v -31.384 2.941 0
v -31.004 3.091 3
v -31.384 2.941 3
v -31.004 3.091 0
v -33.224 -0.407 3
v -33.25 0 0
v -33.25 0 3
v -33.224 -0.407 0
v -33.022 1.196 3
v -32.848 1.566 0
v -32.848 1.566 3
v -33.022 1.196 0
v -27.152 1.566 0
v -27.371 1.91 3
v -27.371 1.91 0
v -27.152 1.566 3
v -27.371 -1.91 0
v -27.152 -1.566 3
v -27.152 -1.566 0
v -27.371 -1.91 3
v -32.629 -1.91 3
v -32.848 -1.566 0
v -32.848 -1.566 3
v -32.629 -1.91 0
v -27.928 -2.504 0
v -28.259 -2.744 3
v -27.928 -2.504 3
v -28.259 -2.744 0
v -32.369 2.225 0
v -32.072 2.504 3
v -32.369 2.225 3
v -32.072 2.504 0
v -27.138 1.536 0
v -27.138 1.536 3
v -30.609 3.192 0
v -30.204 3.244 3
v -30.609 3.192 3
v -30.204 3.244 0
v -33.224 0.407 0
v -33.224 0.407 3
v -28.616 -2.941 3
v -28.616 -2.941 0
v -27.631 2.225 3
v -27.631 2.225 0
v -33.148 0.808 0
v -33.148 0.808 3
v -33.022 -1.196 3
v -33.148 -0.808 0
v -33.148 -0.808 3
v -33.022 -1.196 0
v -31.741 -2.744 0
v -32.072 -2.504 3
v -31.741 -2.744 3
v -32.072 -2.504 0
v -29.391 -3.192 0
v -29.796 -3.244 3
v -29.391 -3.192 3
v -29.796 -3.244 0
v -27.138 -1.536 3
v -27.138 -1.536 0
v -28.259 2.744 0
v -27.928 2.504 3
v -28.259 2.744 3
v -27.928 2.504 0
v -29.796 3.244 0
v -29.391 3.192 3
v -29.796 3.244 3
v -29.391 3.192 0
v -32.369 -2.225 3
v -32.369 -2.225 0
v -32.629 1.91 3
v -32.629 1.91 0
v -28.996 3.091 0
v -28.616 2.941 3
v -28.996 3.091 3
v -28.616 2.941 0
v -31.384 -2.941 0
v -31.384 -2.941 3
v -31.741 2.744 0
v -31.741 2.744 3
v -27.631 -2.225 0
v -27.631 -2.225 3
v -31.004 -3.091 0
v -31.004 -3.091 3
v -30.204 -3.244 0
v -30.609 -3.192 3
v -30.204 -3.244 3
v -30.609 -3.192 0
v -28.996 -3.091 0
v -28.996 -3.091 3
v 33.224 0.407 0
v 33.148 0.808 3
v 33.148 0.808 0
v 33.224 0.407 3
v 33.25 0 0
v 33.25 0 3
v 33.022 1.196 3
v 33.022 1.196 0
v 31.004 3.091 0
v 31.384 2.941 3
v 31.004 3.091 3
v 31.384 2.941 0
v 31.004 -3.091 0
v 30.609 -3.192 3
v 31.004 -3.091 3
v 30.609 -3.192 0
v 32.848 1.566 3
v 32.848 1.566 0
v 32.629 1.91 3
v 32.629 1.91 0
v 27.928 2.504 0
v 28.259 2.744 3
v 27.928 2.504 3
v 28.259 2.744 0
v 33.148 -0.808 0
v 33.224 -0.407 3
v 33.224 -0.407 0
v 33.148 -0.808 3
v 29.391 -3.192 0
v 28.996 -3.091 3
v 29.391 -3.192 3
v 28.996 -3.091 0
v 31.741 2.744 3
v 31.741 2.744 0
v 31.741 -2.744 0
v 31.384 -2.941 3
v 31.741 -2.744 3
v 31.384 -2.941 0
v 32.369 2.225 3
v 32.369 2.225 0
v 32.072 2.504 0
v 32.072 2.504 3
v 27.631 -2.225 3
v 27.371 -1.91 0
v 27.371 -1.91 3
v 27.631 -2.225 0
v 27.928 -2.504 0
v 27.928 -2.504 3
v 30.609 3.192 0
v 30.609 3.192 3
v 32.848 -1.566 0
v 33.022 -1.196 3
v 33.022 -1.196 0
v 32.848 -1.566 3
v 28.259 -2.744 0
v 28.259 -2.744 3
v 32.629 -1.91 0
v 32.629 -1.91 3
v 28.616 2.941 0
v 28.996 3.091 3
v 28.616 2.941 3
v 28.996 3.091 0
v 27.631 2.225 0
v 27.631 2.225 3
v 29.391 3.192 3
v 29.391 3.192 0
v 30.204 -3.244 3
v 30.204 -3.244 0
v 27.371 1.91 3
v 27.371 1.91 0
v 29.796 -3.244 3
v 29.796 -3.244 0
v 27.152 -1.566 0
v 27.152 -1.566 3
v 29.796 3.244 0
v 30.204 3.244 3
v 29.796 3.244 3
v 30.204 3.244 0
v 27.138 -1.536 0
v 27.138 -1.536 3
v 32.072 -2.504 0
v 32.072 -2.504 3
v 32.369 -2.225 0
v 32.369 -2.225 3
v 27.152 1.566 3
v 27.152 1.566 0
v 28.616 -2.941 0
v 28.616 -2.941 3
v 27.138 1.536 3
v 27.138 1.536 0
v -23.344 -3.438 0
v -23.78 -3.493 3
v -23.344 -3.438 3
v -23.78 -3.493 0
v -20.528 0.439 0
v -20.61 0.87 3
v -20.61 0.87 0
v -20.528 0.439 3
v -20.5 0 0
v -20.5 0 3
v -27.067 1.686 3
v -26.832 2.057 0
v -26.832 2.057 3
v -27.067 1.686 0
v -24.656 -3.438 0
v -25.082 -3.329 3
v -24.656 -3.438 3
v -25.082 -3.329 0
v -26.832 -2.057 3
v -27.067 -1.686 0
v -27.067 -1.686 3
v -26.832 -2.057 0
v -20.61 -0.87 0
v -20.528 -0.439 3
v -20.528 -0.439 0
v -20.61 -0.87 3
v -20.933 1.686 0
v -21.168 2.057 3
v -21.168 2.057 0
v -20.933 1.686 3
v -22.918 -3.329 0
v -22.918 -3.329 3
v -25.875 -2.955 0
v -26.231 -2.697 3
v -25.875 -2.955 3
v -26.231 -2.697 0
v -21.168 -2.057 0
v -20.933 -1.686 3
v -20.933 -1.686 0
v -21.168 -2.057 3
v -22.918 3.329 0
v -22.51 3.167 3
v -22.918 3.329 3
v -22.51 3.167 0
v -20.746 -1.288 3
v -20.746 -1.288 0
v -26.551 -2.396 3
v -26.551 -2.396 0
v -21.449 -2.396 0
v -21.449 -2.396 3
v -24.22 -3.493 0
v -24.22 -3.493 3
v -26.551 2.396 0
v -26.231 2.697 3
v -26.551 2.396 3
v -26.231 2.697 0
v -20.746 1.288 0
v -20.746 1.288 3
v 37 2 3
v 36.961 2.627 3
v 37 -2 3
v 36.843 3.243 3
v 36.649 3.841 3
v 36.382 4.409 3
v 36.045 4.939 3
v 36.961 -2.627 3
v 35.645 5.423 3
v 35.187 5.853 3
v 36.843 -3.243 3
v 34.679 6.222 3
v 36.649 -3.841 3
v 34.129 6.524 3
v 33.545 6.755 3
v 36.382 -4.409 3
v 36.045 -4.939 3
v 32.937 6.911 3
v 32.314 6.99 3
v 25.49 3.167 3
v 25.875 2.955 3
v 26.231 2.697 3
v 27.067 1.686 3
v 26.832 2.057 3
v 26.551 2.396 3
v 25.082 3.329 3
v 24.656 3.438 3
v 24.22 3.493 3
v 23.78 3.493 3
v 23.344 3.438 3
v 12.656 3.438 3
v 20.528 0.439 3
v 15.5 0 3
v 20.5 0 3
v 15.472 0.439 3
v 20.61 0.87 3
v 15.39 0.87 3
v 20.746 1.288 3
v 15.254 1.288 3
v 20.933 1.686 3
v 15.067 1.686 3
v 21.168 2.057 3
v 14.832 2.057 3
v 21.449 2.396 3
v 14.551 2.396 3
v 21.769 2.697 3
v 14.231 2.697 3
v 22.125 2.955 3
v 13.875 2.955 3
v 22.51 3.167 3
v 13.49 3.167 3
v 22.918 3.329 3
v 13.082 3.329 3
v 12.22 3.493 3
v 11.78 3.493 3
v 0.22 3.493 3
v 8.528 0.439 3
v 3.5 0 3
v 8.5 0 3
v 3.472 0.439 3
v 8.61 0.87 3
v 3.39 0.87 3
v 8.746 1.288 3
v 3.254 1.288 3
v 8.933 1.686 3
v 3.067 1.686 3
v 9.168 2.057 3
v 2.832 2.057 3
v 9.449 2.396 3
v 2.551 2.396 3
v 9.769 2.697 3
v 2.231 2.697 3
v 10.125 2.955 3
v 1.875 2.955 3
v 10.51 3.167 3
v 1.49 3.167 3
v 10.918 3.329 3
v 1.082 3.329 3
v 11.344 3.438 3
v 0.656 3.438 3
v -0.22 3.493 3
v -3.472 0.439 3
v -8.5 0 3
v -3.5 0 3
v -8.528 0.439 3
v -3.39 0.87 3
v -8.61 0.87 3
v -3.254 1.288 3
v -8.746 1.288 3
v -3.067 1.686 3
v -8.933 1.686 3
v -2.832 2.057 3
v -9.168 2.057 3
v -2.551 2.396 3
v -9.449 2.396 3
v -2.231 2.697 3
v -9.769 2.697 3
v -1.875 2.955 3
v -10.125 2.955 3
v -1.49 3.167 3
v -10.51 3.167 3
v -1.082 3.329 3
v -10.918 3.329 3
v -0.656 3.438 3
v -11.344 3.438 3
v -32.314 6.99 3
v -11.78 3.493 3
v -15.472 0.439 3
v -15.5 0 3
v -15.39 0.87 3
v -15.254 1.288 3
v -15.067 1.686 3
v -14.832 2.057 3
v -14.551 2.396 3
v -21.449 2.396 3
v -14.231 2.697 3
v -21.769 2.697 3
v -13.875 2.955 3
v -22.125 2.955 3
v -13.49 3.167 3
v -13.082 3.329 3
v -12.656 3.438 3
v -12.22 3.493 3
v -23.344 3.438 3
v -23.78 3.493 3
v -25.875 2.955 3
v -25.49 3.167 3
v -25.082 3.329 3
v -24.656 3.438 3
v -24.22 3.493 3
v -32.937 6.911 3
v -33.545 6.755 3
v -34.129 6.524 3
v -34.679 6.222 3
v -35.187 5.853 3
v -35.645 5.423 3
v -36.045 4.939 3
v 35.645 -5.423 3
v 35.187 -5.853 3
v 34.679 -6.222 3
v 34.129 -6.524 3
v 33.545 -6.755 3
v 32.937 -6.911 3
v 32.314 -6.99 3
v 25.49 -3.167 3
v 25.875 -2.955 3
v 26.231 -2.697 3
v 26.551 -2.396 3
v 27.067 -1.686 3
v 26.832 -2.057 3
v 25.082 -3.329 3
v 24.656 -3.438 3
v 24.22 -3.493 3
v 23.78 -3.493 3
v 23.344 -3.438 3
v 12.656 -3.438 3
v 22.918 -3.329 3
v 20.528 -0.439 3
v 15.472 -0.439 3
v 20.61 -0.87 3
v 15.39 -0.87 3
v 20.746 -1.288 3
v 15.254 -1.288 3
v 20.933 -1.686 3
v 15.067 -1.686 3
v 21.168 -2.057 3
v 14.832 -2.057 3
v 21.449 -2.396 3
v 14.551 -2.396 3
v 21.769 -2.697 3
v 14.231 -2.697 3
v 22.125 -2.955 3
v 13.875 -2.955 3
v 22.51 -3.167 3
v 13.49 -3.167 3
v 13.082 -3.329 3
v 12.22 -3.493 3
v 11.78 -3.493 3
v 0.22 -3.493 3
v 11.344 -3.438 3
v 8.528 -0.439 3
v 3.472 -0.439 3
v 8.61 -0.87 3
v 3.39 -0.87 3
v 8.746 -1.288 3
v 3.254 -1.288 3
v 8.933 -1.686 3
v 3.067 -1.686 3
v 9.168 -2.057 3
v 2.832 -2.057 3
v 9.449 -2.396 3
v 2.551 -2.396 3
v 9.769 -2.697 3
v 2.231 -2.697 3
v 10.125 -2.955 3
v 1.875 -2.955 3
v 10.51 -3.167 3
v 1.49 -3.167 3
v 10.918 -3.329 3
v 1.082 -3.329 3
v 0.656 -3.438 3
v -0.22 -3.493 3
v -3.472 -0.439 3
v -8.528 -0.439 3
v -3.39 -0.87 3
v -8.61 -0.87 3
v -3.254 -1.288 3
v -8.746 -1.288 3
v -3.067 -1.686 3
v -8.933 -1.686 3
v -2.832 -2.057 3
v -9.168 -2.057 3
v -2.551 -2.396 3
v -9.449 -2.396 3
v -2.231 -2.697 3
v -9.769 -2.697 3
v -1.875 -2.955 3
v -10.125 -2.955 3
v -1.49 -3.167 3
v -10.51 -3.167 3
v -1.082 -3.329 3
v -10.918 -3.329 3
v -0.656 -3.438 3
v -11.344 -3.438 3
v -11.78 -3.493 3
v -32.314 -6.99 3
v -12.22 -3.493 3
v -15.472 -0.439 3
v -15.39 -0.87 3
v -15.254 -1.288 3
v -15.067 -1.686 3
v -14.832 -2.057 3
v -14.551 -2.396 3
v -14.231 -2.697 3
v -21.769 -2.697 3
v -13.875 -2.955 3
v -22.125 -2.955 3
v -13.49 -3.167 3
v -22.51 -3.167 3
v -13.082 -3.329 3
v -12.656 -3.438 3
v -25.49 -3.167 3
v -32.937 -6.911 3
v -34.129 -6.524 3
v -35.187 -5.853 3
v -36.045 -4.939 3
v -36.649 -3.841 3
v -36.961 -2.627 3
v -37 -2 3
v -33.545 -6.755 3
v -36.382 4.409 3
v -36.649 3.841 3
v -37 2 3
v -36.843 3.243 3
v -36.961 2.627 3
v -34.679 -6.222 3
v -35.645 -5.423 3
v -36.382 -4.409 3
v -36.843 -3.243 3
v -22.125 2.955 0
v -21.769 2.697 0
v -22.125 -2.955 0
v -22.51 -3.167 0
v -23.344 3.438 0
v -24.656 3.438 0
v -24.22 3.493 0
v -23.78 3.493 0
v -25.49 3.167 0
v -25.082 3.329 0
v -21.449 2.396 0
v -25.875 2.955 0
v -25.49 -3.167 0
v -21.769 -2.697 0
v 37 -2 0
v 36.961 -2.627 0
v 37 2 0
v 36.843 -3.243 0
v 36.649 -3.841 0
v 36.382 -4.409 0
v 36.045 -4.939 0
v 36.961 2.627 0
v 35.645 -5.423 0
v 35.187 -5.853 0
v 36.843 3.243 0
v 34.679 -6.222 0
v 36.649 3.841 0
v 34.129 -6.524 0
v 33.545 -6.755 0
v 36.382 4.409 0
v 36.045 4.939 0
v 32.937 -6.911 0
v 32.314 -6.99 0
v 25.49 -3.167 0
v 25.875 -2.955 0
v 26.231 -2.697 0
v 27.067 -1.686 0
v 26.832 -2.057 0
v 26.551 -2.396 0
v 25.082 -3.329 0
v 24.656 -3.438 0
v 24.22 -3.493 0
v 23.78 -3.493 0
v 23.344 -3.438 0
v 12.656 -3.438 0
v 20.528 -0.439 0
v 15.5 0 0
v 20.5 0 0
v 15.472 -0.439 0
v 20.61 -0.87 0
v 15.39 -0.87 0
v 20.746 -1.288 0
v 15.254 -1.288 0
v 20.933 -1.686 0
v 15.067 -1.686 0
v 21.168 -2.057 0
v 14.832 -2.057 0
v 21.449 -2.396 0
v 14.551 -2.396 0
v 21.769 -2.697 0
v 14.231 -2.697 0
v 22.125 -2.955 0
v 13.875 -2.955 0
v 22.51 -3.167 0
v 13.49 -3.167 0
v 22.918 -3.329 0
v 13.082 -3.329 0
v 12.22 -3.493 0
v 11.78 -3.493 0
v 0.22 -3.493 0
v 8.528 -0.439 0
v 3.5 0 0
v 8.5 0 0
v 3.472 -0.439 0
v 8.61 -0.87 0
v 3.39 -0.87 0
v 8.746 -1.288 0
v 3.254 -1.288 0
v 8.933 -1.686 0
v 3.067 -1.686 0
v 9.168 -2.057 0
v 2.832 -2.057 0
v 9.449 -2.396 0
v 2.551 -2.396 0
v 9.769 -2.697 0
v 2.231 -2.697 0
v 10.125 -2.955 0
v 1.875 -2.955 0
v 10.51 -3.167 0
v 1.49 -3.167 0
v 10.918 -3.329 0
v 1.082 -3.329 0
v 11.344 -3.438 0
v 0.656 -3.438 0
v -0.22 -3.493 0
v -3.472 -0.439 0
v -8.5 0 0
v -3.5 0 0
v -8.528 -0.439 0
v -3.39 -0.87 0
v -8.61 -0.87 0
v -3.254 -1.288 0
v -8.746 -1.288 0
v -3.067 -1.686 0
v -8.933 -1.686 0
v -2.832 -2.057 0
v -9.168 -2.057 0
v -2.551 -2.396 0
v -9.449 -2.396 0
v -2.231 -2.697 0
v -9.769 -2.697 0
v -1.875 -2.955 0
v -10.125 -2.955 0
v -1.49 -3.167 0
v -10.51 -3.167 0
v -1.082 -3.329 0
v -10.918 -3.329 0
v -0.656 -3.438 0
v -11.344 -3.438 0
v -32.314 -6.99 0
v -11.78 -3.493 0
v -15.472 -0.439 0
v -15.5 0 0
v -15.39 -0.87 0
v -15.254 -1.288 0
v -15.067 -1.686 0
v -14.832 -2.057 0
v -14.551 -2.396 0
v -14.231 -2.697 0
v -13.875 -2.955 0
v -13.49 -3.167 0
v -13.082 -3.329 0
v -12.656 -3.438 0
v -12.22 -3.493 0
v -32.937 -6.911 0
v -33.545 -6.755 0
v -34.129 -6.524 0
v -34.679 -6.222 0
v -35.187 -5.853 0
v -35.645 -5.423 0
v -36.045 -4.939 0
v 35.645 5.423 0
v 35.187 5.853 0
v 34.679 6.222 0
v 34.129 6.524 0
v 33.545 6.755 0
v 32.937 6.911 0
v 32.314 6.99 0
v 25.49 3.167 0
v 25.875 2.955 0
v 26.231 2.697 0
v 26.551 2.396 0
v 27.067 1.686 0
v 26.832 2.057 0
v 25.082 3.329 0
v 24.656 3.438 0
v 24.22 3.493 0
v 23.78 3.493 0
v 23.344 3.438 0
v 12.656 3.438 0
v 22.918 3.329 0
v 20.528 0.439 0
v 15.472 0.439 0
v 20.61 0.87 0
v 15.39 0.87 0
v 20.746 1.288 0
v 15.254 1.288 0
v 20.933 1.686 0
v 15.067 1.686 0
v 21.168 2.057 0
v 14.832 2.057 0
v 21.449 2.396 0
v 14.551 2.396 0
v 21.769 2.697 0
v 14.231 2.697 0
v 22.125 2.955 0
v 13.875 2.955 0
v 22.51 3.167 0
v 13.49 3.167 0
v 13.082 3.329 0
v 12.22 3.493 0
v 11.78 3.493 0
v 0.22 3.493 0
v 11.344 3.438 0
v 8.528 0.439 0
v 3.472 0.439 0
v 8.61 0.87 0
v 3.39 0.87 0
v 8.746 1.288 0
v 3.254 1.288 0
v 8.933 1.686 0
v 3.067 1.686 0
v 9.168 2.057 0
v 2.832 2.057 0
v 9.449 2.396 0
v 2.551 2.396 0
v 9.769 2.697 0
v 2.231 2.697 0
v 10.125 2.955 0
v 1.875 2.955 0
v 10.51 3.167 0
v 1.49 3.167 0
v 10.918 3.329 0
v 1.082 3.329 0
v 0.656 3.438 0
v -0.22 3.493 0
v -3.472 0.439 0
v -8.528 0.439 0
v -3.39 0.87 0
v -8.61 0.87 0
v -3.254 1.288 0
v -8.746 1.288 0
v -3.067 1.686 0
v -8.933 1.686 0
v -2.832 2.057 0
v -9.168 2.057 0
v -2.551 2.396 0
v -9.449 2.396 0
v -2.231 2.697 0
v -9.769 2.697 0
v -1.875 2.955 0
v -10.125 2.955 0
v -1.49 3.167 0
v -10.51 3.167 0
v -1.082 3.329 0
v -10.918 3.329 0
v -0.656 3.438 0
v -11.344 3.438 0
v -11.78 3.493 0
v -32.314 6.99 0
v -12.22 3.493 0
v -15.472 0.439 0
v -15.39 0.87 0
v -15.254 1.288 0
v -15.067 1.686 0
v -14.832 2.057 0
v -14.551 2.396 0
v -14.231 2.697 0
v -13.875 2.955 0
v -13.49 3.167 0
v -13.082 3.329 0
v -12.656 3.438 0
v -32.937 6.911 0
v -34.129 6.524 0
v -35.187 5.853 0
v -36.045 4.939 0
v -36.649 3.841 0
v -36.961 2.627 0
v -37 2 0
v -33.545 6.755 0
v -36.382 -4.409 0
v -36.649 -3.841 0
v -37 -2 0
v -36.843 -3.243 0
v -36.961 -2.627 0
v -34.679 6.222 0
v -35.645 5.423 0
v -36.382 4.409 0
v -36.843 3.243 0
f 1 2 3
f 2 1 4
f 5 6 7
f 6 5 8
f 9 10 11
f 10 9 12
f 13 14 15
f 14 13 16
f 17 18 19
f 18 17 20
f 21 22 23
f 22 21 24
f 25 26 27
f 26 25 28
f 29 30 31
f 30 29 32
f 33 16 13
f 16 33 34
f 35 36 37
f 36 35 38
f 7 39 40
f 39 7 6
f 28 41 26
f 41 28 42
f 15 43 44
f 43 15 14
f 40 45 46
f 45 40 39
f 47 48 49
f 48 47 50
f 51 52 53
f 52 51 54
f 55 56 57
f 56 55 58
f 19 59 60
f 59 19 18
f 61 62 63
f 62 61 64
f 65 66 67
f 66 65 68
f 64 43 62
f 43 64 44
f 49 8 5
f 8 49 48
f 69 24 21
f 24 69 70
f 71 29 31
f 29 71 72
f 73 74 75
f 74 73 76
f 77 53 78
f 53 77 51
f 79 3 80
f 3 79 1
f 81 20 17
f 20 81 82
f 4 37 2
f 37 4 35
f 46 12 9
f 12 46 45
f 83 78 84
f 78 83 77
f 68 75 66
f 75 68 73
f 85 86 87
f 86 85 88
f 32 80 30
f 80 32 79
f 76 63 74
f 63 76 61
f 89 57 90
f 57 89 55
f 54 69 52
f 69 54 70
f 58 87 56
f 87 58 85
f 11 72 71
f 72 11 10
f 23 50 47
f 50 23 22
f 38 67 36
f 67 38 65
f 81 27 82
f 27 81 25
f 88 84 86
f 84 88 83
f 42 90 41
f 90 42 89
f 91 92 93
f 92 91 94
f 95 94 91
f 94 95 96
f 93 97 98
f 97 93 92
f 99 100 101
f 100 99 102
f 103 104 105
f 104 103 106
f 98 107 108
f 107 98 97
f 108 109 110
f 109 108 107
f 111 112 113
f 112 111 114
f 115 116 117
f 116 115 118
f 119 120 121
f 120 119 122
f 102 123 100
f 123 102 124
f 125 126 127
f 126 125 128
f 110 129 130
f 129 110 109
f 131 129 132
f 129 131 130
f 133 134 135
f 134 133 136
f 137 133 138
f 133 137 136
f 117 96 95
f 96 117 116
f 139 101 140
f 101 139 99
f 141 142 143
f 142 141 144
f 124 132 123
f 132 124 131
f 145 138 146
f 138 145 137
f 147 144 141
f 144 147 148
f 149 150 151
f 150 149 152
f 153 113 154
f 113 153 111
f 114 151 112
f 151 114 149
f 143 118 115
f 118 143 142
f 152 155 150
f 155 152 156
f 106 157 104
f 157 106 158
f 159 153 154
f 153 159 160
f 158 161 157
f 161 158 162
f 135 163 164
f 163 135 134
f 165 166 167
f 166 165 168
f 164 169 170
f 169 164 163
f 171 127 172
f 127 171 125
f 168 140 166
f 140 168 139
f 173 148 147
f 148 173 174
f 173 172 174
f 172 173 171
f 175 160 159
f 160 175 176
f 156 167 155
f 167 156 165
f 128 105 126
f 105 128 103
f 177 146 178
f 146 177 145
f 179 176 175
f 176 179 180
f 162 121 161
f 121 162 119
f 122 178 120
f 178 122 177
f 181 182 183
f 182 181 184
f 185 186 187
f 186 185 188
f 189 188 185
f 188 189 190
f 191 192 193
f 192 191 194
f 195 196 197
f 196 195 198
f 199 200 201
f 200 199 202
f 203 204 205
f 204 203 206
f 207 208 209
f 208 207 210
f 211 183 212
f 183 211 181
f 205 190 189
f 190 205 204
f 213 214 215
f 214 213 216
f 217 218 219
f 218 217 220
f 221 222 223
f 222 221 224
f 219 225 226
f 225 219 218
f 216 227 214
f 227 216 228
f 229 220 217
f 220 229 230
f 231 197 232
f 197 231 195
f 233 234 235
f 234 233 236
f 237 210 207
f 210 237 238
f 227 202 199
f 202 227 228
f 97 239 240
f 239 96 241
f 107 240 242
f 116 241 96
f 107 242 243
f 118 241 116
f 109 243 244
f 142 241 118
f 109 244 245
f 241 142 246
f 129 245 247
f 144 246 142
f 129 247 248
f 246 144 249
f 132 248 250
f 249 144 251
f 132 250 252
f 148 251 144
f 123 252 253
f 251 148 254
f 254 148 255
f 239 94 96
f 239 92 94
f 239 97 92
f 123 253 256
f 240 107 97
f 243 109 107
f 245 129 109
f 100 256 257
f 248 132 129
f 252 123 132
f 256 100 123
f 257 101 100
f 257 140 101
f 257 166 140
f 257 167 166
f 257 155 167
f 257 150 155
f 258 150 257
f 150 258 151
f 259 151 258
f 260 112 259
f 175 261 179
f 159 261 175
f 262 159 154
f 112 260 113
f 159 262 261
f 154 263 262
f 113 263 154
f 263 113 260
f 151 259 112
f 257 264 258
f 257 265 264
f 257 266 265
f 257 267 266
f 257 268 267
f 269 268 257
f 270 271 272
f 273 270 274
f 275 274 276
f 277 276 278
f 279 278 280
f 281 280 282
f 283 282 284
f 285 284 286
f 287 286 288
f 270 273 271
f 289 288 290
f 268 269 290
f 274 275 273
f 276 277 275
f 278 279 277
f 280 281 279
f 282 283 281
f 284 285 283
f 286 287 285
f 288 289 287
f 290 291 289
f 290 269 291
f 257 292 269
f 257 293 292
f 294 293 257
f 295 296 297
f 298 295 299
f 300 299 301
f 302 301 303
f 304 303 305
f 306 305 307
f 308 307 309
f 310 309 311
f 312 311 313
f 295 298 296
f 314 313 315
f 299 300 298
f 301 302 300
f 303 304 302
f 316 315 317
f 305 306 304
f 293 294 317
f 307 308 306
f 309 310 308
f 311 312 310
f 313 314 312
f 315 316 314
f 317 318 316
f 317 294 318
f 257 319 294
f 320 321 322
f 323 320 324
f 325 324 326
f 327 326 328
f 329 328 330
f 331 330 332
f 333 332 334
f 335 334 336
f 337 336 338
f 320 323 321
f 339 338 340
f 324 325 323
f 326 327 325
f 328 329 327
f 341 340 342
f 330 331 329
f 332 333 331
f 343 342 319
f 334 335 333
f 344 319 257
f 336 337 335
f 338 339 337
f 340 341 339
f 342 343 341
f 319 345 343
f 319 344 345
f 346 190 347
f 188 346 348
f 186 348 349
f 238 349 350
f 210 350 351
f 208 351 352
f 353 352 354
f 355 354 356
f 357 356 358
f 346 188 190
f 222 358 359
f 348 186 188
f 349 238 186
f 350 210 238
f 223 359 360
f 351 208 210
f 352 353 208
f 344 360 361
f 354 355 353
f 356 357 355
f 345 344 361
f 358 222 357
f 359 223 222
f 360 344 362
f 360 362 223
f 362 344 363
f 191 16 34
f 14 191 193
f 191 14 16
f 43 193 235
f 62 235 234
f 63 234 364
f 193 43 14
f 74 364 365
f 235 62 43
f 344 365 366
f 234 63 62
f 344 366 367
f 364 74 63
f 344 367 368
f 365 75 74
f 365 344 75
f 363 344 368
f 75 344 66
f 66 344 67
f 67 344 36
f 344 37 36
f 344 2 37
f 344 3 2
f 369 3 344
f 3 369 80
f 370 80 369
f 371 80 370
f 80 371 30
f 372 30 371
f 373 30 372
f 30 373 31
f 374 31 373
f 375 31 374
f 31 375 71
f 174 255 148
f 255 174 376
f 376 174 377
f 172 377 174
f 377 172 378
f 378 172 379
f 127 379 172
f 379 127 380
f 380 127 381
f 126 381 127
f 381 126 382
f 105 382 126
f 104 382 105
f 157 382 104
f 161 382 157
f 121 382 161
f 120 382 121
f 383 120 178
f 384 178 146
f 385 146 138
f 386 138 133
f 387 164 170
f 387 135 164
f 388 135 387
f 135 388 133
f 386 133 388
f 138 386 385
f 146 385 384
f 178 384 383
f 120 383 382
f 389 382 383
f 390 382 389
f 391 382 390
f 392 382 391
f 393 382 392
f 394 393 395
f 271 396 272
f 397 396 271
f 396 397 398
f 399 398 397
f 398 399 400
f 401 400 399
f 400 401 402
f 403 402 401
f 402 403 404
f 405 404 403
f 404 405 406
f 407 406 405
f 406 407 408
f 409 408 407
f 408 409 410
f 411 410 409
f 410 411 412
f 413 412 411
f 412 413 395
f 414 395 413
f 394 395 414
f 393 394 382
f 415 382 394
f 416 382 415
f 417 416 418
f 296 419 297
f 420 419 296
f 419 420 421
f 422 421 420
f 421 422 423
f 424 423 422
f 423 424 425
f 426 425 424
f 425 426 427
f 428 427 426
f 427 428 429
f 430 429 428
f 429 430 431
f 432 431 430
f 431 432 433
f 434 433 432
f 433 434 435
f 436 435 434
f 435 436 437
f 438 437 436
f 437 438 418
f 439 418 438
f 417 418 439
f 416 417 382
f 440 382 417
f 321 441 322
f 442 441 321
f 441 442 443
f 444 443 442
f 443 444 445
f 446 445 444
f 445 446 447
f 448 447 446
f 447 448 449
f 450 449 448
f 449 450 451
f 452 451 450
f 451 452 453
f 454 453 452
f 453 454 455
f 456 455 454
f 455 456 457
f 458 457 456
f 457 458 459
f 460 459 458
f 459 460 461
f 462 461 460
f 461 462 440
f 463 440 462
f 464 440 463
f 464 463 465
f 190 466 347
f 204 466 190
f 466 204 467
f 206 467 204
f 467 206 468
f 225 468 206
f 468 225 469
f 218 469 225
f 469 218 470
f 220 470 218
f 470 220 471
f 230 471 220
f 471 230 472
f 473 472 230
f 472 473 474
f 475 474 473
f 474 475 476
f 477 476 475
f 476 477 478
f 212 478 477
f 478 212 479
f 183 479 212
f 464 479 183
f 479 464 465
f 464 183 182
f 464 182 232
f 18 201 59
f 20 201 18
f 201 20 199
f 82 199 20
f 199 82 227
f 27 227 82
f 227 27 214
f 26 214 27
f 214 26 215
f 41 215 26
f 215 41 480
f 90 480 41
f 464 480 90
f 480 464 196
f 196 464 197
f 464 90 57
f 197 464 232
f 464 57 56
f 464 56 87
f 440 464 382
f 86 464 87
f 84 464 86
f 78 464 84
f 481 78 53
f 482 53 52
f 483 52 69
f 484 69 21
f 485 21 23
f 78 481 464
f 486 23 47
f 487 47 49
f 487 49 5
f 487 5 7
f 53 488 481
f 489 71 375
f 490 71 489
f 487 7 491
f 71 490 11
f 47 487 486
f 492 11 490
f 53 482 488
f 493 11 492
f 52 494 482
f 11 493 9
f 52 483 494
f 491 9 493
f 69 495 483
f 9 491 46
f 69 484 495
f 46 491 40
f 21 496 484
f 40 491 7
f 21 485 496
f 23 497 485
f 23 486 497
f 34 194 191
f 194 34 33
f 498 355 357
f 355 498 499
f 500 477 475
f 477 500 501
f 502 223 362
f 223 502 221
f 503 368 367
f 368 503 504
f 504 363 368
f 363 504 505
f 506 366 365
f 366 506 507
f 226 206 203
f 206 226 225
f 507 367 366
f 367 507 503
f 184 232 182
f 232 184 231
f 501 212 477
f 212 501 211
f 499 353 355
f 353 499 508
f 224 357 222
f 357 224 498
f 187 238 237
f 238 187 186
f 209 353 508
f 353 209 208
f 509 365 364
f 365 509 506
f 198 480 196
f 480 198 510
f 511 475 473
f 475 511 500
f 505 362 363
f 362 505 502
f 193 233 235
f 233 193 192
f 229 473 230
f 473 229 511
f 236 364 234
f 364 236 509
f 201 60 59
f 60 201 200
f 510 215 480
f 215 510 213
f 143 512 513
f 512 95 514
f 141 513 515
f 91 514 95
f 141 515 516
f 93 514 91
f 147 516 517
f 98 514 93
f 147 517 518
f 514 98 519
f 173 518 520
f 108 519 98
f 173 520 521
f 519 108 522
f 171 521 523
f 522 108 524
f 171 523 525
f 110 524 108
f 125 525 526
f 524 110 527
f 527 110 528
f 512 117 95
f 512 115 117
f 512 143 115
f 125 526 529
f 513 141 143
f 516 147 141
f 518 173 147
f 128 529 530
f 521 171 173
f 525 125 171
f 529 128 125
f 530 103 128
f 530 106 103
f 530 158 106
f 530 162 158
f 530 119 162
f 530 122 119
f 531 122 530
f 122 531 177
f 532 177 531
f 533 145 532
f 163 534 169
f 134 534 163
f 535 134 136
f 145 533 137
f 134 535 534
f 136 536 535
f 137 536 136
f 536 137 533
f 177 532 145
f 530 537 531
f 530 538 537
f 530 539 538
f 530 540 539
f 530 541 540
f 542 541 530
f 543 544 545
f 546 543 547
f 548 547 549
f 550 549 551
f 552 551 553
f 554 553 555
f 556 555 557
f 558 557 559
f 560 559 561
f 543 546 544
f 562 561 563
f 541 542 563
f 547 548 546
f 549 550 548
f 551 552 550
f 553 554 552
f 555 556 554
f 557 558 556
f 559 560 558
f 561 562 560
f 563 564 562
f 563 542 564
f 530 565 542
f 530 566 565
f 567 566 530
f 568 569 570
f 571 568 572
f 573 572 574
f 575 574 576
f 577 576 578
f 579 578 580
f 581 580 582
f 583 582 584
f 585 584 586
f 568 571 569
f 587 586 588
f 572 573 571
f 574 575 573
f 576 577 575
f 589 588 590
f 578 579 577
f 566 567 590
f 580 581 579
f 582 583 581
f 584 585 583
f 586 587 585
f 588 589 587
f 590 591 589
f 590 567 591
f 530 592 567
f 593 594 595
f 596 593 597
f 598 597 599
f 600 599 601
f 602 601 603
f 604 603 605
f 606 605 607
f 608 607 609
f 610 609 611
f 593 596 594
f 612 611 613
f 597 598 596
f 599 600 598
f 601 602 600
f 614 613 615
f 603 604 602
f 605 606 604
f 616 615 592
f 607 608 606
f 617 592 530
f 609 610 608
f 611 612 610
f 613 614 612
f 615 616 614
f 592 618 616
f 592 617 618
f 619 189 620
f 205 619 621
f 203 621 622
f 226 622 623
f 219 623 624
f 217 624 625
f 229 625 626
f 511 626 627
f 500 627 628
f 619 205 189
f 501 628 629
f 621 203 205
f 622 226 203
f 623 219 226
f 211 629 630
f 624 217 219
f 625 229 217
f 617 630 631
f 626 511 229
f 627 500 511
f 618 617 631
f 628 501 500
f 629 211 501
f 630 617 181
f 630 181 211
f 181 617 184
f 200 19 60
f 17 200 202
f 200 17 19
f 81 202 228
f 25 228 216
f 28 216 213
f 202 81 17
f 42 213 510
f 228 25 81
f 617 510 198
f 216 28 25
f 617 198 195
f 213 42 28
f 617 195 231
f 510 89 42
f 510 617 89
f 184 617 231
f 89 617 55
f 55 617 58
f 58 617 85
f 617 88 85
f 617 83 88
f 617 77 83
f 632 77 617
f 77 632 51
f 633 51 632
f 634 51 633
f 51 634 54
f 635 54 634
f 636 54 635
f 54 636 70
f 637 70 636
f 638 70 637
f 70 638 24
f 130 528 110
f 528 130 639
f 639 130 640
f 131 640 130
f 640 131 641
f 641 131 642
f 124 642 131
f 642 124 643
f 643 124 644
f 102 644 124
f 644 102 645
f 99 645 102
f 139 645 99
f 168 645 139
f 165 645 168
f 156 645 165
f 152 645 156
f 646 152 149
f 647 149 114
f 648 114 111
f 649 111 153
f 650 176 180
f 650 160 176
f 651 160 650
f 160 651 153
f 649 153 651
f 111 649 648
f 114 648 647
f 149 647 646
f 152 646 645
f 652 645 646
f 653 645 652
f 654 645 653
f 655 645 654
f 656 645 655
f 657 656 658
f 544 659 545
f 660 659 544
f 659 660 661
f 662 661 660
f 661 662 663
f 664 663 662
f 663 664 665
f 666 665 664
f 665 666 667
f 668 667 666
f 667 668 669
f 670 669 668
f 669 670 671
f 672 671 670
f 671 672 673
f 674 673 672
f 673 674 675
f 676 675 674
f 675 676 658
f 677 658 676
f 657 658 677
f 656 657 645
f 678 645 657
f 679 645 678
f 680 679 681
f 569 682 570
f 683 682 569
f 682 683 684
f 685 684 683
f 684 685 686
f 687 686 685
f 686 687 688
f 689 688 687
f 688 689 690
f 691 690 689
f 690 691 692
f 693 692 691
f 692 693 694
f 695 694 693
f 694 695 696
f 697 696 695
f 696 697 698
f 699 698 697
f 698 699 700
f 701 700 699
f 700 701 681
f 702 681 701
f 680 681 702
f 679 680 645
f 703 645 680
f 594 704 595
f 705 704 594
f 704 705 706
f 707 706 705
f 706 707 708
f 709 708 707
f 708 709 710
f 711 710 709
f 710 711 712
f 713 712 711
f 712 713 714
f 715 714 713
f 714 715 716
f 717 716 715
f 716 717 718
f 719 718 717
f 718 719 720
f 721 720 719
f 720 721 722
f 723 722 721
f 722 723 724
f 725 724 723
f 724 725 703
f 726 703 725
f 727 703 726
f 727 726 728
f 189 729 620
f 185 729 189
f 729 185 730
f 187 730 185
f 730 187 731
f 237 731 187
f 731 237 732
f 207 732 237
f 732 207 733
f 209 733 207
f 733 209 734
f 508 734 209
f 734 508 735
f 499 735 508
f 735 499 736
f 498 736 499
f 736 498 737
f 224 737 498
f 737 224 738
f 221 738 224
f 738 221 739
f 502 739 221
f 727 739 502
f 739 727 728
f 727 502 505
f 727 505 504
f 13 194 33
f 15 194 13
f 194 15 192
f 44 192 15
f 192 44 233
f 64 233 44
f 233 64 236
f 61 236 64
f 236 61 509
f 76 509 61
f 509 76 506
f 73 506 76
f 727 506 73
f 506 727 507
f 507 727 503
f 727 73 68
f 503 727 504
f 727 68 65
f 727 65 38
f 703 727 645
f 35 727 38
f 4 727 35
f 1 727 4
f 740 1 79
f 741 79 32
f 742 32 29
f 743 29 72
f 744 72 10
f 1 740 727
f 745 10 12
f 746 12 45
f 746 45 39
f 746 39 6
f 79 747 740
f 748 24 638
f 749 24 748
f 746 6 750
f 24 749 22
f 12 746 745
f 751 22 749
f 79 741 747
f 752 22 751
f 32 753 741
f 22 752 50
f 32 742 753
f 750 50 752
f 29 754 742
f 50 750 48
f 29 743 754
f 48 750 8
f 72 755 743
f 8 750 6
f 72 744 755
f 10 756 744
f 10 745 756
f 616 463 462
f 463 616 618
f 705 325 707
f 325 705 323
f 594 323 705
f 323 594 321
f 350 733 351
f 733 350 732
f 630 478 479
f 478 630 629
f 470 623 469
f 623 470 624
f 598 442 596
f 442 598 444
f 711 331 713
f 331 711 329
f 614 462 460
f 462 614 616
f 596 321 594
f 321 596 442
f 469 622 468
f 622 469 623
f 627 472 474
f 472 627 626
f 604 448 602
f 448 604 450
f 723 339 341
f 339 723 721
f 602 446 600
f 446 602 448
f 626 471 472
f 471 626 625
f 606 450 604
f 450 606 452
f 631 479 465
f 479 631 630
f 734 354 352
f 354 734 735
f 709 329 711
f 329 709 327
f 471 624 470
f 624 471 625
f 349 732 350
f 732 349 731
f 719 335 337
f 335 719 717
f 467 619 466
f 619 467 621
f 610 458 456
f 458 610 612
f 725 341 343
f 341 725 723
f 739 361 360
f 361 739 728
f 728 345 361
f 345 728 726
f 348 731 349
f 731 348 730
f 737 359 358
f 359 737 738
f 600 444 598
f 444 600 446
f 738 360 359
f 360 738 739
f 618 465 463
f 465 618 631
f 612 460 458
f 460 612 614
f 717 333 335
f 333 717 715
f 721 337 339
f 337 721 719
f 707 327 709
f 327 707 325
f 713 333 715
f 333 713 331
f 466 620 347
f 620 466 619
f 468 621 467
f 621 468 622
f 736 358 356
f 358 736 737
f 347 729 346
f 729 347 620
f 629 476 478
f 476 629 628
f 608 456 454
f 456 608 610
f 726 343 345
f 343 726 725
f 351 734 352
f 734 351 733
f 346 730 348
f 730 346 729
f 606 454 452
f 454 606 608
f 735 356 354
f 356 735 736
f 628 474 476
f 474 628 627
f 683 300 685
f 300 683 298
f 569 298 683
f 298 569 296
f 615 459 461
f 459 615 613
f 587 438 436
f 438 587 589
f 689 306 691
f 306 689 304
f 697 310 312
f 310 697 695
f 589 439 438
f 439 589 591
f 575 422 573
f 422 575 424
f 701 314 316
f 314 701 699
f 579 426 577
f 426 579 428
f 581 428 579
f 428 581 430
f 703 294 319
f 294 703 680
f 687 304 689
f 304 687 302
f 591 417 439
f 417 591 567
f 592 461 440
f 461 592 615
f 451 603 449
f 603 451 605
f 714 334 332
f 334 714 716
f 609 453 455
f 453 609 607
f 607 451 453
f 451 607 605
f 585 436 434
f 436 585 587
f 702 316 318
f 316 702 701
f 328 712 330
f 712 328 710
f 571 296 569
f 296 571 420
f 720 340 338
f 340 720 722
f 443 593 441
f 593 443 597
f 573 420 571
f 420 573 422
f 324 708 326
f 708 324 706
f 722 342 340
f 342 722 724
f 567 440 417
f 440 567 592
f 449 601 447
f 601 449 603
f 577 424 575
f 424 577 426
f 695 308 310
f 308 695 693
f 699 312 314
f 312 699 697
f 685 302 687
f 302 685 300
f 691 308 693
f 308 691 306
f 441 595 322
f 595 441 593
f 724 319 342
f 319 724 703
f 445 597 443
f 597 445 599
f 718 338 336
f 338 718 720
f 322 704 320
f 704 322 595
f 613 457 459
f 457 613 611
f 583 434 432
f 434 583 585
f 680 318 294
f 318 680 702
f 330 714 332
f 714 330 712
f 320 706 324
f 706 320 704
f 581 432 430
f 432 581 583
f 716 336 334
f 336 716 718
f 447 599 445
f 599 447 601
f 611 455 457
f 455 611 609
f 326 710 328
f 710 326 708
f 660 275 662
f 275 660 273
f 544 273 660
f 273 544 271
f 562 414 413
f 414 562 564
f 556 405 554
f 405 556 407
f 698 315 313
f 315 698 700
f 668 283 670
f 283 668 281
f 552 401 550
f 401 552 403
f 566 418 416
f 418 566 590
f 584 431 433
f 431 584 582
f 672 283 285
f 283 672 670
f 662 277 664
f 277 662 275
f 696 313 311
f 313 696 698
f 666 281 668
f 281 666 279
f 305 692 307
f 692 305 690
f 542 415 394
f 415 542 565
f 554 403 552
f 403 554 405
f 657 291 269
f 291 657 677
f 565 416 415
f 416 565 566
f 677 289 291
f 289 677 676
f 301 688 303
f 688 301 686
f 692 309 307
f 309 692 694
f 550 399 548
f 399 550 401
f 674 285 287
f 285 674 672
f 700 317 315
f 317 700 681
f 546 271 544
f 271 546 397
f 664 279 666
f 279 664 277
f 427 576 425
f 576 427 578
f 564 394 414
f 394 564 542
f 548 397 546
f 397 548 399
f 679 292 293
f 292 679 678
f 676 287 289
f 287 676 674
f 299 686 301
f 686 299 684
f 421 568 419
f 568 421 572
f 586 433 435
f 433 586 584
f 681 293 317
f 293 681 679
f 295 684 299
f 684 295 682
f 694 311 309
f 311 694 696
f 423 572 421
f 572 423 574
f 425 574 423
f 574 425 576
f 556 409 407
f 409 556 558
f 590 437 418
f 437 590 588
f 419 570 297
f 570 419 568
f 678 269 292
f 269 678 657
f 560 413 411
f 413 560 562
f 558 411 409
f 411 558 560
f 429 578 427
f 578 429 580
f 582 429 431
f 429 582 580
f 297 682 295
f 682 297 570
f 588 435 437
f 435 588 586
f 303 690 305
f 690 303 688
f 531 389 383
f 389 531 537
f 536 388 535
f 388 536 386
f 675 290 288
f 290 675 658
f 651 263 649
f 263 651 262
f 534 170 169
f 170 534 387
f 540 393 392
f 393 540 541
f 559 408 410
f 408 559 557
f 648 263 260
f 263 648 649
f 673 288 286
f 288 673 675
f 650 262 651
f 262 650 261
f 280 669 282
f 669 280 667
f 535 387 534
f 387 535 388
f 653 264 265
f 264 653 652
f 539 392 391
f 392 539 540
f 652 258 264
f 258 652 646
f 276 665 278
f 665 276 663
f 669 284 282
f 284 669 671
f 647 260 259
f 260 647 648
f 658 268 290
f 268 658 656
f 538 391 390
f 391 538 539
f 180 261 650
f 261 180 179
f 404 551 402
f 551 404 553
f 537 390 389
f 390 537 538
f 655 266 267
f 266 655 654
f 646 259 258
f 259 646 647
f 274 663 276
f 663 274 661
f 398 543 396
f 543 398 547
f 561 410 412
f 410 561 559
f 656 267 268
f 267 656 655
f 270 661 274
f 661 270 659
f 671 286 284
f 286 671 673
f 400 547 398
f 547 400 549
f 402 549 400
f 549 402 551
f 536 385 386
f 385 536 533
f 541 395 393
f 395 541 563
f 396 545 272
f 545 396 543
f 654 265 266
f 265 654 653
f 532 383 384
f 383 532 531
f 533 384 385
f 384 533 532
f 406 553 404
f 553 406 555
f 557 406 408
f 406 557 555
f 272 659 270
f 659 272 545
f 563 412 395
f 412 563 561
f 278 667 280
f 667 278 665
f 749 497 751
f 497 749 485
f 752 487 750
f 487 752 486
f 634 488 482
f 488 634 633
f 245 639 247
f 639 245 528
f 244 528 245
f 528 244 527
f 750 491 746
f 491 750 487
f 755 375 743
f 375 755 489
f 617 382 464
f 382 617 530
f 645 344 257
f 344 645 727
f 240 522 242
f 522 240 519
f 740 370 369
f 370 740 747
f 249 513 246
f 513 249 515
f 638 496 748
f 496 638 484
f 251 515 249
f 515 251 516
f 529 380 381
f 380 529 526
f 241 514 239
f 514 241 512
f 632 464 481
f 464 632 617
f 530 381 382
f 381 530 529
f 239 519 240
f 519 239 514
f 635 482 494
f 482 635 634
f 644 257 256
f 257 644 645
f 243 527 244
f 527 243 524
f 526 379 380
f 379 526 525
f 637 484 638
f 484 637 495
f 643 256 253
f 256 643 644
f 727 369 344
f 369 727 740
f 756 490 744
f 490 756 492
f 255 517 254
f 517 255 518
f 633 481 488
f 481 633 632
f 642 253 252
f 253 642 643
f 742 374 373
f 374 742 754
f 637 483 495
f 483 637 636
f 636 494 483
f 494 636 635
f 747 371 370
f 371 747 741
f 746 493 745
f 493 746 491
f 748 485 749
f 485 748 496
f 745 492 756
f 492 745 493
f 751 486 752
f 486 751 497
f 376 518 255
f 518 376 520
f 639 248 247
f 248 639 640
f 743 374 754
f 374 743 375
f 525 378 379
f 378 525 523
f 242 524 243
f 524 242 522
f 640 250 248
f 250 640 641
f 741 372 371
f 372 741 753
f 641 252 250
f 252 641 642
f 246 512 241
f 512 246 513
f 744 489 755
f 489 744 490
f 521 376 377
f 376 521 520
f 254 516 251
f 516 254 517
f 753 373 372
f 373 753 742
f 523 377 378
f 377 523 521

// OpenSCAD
$fn = 50;


difference() {
	union() {
		hull() {
			translate(v = [-32.0000000000, 2.0000000000, 0]) {
				cylinder(h = 3, r = 5);
			}
			translate(v = [32.0000000000, 2.0000000000, 0]) {
				cylinder(h = 3, r = 5);
			}
			translate(v = [-32.0000000000, -2.0000000000, 0]) {
				cylinder(h = 3, r = 5);
			}
			translate(v = [32.0000000000, -2.0000000000, 0]) {
				cylinder(h = 3, r = 5);
			}
		}
	}
	union() {
		#translate(v = [-30.0000000000, 0.0000000000, -100.0000000000]) {
			cylinder(h = 200, r = 3.2500000000);
		}
		#translate(v = [-30.0000000000, 0.0000000000, -100.0000000000]) {
			cylinder(h = 200, r = 3.2500000000);
		}
		#translate(v = [30.0000000000, 0.0000000000, -100.0000000000]) {
			cylinder(h = 200, r = 3.2500000000);
		}
		#translate(v = [30.0000000000, 0.0000000000, -100.0000000000]) {
			cylinder(h = 200, r = 3.2500000000);
		}
		#translate(v = [-24.0000000000, 0, 0]) {
			cylinder(h = 3, r = 3.5000000000);
		}
		#translate(v = [-12.0000000000, 0, 0]) {
			cylinder(h = 3, r = 3.5000000000);
		}
		#cylinder(h = 3, r = 3.5000000000);
		#translate(v = [12.0000000000, 0, 0]) {
			cylinder(h = 3, r = 3.5000000000);
		}
		#translate(v = [24.0000000000, 0, 0]) {
			cylinder(h = 3, r = 3.5000000000);
		}
	}
}
